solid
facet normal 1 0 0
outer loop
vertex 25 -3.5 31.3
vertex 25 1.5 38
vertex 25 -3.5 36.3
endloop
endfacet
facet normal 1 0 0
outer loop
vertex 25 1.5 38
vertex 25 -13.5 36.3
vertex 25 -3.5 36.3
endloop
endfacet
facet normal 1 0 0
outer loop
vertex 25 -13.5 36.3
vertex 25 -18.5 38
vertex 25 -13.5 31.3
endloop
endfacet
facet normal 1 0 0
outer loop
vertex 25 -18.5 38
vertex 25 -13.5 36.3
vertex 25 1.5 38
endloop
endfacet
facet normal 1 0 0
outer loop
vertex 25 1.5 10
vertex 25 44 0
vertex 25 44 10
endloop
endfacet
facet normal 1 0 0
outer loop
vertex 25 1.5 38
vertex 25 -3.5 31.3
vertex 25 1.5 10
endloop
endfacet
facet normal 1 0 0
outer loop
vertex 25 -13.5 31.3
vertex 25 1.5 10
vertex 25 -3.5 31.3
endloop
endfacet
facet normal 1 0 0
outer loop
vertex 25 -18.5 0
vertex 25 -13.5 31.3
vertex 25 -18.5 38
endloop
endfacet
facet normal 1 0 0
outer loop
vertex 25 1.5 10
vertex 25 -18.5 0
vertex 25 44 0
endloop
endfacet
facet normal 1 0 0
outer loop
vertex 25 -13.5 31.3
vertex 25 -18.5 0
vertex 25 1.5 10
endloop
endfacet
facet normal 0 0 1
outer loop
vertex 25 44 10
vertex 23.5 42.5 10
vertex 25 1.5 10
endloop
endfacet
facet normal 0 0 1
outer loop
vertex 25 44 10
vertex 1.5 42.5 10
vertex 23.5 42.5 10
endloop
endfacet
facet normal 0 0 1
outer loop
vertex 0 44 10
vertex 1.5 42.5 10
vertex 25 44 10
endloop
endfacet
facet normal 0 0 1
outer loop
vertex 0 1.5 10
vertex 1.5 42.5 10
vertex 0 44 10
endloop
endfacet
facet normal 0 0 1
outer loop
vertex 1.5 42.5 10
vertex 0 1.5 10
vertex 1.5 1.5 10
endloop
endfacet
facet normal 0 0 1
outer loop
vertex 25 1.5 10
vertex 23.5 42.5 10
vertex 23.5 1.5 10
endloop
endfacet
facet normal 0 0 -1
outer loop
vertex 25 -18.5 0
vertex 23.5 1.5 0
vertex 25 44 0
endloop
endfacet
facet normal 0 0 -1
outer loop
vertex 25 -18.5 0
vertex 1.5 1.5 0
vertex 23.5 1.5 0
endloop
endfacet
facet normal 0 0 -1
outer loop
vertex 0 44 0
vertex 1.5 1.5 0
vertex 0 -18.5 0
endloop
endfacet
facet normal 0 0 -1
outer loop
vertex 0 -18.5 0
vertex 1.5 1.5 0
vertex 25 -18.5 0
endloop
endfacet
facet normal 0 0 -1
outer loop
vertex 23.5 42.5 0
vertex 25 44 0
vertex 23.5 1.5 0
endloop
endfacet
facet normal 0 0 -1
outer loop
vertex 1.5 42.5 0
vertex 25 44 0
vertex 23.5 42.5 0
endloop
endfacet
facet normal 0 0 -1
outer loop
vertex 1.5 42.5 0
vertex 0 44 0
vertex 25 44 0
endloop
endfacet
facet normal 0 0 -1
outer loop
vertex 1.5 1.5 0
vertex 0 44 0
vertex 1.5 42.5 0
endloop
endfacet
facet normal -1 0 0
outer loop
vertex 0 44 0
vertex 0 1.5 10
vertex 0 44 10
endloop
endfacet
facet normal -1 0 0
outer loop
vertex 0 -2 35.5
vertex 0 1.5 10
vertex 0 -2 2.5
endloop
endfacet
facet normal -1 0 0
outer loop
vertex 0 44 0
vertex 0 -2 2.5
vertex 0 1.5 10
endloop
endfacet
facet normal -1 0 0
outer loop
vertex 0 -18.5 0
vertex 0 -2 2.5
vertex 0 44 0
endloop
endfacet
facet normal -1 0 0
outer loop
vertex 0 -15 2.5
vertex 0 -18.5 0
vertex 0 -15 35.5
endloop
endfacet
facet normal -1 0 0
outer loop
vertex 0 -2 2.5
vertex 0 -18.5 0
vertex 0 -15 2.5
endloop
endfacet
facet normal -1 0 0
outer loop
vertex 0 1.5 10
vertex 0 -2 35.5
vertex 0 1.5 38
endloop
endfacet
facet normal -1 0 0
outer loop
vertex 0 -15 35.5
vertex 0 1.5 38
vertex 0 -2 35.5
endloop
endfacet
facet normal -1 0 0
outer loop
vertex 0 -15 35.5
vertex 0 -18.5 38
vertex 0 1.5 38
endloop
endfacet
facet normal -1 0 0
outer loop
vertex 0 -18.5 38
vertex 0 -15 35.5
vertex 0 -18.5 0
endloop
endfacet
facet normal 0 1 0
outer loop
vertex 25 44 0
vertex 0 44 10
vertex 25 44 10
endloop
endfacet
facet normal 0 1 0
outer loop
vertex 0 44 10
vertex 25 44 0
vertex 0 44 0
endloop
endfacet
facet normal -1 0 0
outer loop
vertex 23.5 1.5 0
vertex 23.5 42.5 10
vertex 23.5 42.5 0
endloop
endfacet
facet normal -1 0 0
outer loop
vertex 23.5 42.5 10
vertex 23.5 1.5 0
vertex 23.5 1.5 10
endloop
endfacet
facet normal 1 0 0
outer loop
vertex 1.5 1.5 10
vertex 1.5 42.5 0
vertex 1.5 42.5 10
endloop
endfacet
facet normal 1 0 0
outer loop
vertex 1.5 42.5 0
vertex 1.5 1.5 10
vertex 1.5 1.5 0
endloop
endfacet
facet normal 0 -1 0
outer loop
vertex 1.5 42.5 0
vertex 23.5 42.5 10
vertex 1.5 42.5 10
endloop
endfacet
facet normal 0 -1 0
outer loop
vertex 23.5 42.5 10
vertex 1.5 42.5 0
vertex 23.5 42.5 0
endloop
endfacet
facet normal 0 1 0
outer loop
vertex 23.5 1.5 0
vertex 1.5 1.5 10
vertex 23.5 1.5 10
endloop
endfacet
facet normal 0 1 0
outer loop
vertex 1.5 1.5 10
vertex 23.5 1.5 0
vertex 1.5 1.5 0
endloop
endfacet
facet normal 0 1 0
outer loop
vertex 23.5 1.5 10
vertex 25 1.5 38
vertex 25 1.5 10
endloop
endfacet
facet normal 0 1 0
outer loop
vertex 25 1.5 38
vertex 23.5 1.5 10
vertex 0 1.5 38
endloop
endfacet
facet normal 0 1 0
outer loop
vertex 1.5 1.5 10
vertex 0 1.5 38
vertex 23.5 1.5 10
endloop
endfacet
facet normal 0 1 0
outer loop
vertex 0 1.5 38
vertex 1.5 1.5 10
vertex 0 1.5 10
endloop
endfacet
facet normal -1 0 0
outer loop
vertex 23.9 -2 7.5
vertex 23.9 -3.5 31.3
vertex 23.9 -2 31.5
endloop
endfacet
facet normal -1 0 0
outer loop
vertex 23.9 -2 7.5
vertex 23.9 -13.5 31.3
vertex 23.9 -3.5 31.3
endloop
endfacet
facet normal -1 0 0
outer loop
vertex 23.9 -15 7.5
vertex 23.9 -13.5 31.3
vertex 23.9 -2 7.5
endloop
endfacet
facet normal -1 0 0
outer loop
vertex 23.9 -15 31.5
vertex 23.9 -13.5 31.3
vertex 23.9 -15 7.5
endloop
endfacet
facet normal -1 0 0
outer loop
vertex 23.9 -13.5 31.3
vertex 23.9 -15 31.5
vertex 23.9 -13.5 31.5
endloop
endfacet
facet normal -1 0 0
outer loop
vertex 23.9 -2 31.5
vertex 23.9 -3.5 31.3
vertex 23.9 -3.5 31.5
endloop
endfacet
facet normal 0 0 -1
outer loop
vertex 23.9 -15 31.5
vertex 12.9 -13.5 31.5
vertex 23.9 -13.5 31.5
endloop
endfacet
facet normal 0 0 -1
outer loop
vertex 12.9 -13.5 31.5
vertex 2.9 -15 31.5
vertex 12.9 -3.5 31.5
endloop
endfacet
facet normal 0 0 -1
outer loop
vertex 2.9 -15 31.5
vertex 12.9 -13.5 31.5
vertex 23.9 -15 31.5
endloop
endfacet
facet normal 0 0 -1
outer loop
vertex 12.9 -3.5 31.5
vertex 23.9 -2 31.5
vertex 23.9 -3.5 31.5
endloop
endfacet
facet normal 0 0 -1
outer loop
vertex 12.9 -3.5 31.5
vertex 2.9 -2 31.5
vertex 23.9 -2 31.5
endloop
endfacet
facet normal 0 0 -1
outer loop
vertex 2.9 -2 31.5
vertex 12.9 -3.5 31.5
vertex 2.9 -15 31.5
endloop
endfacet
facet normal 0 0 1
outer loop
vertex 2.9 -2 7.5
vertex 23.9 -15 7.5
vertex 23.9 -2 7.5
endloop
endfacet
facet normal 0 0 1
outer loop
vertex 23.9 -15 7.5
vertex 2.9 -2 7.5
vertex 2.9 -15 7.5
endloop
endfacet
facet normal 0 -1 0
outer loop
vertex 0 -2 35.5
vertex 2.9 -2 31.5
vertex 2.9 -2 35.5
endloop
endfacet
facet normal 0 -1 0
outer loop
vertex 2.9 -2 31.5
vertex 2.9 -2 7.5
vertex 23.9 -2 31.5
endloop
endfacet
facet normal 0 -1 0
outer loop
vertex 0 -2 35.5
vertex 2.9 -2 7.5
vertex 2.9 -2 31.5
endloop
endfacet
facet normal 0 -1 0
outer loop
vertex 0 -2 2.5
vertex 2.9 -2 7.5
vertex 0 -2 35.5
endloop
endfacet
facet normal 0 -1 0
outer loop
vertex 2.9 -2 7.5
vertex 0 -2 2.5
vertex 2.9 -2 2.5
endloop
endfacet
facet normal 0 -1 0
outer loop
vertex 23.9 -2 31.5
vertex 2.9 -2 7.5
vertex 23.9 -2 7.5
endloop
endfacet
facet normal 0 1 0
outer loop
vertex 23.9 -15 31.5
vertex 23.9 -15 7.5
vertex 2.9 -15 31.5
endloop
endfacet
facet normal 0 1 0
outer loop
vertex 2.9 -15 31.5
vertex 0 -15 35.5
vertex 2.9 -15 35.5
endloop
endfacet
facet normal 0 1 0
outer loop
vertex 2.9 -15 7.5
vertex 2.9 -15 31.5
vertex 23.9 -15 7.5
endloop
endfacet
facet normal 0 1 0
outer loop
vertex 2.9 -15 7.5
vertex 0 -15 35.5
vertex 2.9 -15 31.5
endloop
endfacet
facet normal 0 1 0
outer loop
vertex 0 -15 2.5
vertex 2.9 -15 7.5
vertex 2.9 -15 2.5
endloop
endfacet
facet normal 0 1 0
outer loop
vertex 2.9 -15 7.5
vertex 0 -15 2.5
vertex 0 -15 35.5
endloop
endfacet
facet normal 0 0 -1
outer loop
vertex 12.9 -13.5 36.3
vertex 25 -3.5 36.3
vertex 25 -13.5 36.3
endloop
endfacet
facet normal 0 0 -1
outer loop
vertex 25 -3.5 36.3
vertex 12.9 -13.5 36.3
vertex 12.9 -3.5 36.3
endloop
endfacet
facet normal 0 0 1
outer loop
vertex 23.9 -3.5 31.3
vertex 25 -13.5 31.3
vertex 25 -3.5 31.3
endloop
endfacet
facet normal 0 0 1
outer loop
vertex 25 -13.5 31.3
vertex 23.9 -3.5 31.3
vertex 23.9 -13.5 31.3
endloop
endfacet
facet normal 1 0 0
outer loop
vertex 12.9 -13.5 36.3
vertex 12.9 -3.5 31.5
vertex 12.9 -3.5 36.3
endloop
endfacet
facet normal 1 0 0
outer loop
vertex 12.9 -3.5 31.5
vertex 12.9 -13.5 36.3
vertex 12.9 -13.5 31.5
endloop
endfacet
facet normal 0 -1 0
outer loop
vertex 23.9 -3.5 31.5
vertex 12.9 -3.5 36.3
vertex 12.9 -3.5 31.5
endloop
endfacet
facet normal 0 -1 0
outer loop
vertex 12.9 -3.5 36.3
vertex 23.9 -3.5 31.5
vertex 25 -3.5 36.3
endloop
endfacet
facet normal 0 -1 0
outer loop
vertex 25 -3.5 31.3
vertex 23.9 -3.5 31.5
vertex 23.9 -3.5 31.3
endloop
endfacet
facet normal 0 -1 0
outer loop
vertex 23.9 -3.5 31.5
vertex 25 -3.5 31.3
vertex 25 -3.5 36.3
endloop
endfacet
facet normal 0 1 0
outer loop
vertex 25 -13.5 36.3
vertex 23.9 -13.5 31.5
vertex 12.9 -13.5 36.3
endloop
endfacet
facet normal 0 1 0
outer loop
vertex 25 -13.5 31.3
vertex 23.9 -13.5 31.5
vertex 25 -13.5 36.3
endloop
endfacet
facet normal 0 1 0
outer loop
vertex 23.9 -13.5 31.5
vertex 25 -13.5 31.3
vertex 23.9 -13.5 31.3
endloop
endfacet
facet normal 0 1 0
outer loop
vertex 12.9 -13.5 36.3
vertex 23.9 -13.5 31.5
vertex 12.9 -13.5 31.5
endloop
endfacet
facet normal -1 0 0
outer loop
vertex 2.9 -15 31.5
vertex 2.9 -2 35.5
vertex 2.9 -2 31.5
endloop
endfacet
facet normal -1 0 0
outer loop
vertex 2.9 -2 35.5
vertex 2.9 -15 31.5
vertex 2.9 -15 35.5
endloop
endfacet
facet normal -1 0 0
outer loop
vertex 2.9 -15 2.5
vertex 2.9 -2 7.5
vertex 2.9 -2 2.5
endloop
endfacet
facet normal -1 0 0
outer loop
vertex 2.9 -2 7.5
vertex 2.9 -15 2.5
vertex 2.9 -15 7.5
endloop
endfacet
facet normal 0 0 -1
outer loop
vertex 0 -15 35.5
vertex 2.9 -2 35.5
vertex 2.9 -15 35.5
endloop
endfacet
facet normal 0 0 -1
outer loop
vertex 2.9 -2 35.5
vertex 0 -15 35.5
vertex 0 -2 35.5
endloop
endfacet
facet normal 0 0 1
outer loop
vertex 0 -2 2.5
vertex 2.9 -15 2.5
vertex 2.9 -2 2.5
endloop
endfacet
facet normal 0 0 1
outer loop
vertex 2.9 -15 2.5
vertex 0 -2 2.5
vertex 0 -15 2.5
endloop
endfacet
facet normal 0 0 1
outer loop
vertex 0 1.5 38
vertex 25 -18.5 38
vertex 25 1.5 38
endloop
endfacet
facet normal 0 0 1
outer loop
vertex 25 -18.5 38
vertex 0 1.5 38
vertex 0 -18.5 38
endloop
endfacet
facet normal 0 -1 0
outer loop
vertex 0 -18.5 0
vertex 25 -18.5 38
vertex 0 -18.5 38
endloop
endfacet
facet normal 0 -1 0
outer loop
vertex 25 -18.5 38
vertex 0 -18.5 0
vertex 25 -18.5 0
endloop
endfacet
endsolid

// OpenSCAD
//---------------------------------------------------------------------------------------------
//-- Print of OpenBeam
//-- (c) Martin Korinek	m.ko@inode.at
//-- April-2015
//---------------------------------------------------------------------------------------------
//--
//---------------------------------------------------------------------------------------------

use <MCAD/fonts.scad>

//fragment minimum angle
  $fa=10.0;

//fragment minimum size
  $fs=0.2;
  
  
  HolzBreite = 22.0;
  HolzLaenge = 41.0;
  HalterDicke = 1.5;
  HalterHoehe =10.0;
  PlattenBreite = 20.0;

difference()
{
	//cube([70,90,1],center = true);
	cube([HolzBreite+2*HalterDicke,HolzLaenge+2*HalterDicke,HalterHoehe]);
	translate([HalterDicke,HalterDicke,])
    cube([HolzBreite,HolzLaenge,HalterHoehe]);
	
}

translate([0,-20+HalterDicke,0])
difference()
{  
    cube([HolzBreite+2*HalterDicke,20,38]);
    translate([-0.1,3.5,7.5])
    {
        //size of micro servo
        #cube([24,13,24]);
        translate([13,1.5,23.8])
        #cube([30,10,5]);
        translate([0,0,-5])
		#cube([3,13,33]);
	}
}
